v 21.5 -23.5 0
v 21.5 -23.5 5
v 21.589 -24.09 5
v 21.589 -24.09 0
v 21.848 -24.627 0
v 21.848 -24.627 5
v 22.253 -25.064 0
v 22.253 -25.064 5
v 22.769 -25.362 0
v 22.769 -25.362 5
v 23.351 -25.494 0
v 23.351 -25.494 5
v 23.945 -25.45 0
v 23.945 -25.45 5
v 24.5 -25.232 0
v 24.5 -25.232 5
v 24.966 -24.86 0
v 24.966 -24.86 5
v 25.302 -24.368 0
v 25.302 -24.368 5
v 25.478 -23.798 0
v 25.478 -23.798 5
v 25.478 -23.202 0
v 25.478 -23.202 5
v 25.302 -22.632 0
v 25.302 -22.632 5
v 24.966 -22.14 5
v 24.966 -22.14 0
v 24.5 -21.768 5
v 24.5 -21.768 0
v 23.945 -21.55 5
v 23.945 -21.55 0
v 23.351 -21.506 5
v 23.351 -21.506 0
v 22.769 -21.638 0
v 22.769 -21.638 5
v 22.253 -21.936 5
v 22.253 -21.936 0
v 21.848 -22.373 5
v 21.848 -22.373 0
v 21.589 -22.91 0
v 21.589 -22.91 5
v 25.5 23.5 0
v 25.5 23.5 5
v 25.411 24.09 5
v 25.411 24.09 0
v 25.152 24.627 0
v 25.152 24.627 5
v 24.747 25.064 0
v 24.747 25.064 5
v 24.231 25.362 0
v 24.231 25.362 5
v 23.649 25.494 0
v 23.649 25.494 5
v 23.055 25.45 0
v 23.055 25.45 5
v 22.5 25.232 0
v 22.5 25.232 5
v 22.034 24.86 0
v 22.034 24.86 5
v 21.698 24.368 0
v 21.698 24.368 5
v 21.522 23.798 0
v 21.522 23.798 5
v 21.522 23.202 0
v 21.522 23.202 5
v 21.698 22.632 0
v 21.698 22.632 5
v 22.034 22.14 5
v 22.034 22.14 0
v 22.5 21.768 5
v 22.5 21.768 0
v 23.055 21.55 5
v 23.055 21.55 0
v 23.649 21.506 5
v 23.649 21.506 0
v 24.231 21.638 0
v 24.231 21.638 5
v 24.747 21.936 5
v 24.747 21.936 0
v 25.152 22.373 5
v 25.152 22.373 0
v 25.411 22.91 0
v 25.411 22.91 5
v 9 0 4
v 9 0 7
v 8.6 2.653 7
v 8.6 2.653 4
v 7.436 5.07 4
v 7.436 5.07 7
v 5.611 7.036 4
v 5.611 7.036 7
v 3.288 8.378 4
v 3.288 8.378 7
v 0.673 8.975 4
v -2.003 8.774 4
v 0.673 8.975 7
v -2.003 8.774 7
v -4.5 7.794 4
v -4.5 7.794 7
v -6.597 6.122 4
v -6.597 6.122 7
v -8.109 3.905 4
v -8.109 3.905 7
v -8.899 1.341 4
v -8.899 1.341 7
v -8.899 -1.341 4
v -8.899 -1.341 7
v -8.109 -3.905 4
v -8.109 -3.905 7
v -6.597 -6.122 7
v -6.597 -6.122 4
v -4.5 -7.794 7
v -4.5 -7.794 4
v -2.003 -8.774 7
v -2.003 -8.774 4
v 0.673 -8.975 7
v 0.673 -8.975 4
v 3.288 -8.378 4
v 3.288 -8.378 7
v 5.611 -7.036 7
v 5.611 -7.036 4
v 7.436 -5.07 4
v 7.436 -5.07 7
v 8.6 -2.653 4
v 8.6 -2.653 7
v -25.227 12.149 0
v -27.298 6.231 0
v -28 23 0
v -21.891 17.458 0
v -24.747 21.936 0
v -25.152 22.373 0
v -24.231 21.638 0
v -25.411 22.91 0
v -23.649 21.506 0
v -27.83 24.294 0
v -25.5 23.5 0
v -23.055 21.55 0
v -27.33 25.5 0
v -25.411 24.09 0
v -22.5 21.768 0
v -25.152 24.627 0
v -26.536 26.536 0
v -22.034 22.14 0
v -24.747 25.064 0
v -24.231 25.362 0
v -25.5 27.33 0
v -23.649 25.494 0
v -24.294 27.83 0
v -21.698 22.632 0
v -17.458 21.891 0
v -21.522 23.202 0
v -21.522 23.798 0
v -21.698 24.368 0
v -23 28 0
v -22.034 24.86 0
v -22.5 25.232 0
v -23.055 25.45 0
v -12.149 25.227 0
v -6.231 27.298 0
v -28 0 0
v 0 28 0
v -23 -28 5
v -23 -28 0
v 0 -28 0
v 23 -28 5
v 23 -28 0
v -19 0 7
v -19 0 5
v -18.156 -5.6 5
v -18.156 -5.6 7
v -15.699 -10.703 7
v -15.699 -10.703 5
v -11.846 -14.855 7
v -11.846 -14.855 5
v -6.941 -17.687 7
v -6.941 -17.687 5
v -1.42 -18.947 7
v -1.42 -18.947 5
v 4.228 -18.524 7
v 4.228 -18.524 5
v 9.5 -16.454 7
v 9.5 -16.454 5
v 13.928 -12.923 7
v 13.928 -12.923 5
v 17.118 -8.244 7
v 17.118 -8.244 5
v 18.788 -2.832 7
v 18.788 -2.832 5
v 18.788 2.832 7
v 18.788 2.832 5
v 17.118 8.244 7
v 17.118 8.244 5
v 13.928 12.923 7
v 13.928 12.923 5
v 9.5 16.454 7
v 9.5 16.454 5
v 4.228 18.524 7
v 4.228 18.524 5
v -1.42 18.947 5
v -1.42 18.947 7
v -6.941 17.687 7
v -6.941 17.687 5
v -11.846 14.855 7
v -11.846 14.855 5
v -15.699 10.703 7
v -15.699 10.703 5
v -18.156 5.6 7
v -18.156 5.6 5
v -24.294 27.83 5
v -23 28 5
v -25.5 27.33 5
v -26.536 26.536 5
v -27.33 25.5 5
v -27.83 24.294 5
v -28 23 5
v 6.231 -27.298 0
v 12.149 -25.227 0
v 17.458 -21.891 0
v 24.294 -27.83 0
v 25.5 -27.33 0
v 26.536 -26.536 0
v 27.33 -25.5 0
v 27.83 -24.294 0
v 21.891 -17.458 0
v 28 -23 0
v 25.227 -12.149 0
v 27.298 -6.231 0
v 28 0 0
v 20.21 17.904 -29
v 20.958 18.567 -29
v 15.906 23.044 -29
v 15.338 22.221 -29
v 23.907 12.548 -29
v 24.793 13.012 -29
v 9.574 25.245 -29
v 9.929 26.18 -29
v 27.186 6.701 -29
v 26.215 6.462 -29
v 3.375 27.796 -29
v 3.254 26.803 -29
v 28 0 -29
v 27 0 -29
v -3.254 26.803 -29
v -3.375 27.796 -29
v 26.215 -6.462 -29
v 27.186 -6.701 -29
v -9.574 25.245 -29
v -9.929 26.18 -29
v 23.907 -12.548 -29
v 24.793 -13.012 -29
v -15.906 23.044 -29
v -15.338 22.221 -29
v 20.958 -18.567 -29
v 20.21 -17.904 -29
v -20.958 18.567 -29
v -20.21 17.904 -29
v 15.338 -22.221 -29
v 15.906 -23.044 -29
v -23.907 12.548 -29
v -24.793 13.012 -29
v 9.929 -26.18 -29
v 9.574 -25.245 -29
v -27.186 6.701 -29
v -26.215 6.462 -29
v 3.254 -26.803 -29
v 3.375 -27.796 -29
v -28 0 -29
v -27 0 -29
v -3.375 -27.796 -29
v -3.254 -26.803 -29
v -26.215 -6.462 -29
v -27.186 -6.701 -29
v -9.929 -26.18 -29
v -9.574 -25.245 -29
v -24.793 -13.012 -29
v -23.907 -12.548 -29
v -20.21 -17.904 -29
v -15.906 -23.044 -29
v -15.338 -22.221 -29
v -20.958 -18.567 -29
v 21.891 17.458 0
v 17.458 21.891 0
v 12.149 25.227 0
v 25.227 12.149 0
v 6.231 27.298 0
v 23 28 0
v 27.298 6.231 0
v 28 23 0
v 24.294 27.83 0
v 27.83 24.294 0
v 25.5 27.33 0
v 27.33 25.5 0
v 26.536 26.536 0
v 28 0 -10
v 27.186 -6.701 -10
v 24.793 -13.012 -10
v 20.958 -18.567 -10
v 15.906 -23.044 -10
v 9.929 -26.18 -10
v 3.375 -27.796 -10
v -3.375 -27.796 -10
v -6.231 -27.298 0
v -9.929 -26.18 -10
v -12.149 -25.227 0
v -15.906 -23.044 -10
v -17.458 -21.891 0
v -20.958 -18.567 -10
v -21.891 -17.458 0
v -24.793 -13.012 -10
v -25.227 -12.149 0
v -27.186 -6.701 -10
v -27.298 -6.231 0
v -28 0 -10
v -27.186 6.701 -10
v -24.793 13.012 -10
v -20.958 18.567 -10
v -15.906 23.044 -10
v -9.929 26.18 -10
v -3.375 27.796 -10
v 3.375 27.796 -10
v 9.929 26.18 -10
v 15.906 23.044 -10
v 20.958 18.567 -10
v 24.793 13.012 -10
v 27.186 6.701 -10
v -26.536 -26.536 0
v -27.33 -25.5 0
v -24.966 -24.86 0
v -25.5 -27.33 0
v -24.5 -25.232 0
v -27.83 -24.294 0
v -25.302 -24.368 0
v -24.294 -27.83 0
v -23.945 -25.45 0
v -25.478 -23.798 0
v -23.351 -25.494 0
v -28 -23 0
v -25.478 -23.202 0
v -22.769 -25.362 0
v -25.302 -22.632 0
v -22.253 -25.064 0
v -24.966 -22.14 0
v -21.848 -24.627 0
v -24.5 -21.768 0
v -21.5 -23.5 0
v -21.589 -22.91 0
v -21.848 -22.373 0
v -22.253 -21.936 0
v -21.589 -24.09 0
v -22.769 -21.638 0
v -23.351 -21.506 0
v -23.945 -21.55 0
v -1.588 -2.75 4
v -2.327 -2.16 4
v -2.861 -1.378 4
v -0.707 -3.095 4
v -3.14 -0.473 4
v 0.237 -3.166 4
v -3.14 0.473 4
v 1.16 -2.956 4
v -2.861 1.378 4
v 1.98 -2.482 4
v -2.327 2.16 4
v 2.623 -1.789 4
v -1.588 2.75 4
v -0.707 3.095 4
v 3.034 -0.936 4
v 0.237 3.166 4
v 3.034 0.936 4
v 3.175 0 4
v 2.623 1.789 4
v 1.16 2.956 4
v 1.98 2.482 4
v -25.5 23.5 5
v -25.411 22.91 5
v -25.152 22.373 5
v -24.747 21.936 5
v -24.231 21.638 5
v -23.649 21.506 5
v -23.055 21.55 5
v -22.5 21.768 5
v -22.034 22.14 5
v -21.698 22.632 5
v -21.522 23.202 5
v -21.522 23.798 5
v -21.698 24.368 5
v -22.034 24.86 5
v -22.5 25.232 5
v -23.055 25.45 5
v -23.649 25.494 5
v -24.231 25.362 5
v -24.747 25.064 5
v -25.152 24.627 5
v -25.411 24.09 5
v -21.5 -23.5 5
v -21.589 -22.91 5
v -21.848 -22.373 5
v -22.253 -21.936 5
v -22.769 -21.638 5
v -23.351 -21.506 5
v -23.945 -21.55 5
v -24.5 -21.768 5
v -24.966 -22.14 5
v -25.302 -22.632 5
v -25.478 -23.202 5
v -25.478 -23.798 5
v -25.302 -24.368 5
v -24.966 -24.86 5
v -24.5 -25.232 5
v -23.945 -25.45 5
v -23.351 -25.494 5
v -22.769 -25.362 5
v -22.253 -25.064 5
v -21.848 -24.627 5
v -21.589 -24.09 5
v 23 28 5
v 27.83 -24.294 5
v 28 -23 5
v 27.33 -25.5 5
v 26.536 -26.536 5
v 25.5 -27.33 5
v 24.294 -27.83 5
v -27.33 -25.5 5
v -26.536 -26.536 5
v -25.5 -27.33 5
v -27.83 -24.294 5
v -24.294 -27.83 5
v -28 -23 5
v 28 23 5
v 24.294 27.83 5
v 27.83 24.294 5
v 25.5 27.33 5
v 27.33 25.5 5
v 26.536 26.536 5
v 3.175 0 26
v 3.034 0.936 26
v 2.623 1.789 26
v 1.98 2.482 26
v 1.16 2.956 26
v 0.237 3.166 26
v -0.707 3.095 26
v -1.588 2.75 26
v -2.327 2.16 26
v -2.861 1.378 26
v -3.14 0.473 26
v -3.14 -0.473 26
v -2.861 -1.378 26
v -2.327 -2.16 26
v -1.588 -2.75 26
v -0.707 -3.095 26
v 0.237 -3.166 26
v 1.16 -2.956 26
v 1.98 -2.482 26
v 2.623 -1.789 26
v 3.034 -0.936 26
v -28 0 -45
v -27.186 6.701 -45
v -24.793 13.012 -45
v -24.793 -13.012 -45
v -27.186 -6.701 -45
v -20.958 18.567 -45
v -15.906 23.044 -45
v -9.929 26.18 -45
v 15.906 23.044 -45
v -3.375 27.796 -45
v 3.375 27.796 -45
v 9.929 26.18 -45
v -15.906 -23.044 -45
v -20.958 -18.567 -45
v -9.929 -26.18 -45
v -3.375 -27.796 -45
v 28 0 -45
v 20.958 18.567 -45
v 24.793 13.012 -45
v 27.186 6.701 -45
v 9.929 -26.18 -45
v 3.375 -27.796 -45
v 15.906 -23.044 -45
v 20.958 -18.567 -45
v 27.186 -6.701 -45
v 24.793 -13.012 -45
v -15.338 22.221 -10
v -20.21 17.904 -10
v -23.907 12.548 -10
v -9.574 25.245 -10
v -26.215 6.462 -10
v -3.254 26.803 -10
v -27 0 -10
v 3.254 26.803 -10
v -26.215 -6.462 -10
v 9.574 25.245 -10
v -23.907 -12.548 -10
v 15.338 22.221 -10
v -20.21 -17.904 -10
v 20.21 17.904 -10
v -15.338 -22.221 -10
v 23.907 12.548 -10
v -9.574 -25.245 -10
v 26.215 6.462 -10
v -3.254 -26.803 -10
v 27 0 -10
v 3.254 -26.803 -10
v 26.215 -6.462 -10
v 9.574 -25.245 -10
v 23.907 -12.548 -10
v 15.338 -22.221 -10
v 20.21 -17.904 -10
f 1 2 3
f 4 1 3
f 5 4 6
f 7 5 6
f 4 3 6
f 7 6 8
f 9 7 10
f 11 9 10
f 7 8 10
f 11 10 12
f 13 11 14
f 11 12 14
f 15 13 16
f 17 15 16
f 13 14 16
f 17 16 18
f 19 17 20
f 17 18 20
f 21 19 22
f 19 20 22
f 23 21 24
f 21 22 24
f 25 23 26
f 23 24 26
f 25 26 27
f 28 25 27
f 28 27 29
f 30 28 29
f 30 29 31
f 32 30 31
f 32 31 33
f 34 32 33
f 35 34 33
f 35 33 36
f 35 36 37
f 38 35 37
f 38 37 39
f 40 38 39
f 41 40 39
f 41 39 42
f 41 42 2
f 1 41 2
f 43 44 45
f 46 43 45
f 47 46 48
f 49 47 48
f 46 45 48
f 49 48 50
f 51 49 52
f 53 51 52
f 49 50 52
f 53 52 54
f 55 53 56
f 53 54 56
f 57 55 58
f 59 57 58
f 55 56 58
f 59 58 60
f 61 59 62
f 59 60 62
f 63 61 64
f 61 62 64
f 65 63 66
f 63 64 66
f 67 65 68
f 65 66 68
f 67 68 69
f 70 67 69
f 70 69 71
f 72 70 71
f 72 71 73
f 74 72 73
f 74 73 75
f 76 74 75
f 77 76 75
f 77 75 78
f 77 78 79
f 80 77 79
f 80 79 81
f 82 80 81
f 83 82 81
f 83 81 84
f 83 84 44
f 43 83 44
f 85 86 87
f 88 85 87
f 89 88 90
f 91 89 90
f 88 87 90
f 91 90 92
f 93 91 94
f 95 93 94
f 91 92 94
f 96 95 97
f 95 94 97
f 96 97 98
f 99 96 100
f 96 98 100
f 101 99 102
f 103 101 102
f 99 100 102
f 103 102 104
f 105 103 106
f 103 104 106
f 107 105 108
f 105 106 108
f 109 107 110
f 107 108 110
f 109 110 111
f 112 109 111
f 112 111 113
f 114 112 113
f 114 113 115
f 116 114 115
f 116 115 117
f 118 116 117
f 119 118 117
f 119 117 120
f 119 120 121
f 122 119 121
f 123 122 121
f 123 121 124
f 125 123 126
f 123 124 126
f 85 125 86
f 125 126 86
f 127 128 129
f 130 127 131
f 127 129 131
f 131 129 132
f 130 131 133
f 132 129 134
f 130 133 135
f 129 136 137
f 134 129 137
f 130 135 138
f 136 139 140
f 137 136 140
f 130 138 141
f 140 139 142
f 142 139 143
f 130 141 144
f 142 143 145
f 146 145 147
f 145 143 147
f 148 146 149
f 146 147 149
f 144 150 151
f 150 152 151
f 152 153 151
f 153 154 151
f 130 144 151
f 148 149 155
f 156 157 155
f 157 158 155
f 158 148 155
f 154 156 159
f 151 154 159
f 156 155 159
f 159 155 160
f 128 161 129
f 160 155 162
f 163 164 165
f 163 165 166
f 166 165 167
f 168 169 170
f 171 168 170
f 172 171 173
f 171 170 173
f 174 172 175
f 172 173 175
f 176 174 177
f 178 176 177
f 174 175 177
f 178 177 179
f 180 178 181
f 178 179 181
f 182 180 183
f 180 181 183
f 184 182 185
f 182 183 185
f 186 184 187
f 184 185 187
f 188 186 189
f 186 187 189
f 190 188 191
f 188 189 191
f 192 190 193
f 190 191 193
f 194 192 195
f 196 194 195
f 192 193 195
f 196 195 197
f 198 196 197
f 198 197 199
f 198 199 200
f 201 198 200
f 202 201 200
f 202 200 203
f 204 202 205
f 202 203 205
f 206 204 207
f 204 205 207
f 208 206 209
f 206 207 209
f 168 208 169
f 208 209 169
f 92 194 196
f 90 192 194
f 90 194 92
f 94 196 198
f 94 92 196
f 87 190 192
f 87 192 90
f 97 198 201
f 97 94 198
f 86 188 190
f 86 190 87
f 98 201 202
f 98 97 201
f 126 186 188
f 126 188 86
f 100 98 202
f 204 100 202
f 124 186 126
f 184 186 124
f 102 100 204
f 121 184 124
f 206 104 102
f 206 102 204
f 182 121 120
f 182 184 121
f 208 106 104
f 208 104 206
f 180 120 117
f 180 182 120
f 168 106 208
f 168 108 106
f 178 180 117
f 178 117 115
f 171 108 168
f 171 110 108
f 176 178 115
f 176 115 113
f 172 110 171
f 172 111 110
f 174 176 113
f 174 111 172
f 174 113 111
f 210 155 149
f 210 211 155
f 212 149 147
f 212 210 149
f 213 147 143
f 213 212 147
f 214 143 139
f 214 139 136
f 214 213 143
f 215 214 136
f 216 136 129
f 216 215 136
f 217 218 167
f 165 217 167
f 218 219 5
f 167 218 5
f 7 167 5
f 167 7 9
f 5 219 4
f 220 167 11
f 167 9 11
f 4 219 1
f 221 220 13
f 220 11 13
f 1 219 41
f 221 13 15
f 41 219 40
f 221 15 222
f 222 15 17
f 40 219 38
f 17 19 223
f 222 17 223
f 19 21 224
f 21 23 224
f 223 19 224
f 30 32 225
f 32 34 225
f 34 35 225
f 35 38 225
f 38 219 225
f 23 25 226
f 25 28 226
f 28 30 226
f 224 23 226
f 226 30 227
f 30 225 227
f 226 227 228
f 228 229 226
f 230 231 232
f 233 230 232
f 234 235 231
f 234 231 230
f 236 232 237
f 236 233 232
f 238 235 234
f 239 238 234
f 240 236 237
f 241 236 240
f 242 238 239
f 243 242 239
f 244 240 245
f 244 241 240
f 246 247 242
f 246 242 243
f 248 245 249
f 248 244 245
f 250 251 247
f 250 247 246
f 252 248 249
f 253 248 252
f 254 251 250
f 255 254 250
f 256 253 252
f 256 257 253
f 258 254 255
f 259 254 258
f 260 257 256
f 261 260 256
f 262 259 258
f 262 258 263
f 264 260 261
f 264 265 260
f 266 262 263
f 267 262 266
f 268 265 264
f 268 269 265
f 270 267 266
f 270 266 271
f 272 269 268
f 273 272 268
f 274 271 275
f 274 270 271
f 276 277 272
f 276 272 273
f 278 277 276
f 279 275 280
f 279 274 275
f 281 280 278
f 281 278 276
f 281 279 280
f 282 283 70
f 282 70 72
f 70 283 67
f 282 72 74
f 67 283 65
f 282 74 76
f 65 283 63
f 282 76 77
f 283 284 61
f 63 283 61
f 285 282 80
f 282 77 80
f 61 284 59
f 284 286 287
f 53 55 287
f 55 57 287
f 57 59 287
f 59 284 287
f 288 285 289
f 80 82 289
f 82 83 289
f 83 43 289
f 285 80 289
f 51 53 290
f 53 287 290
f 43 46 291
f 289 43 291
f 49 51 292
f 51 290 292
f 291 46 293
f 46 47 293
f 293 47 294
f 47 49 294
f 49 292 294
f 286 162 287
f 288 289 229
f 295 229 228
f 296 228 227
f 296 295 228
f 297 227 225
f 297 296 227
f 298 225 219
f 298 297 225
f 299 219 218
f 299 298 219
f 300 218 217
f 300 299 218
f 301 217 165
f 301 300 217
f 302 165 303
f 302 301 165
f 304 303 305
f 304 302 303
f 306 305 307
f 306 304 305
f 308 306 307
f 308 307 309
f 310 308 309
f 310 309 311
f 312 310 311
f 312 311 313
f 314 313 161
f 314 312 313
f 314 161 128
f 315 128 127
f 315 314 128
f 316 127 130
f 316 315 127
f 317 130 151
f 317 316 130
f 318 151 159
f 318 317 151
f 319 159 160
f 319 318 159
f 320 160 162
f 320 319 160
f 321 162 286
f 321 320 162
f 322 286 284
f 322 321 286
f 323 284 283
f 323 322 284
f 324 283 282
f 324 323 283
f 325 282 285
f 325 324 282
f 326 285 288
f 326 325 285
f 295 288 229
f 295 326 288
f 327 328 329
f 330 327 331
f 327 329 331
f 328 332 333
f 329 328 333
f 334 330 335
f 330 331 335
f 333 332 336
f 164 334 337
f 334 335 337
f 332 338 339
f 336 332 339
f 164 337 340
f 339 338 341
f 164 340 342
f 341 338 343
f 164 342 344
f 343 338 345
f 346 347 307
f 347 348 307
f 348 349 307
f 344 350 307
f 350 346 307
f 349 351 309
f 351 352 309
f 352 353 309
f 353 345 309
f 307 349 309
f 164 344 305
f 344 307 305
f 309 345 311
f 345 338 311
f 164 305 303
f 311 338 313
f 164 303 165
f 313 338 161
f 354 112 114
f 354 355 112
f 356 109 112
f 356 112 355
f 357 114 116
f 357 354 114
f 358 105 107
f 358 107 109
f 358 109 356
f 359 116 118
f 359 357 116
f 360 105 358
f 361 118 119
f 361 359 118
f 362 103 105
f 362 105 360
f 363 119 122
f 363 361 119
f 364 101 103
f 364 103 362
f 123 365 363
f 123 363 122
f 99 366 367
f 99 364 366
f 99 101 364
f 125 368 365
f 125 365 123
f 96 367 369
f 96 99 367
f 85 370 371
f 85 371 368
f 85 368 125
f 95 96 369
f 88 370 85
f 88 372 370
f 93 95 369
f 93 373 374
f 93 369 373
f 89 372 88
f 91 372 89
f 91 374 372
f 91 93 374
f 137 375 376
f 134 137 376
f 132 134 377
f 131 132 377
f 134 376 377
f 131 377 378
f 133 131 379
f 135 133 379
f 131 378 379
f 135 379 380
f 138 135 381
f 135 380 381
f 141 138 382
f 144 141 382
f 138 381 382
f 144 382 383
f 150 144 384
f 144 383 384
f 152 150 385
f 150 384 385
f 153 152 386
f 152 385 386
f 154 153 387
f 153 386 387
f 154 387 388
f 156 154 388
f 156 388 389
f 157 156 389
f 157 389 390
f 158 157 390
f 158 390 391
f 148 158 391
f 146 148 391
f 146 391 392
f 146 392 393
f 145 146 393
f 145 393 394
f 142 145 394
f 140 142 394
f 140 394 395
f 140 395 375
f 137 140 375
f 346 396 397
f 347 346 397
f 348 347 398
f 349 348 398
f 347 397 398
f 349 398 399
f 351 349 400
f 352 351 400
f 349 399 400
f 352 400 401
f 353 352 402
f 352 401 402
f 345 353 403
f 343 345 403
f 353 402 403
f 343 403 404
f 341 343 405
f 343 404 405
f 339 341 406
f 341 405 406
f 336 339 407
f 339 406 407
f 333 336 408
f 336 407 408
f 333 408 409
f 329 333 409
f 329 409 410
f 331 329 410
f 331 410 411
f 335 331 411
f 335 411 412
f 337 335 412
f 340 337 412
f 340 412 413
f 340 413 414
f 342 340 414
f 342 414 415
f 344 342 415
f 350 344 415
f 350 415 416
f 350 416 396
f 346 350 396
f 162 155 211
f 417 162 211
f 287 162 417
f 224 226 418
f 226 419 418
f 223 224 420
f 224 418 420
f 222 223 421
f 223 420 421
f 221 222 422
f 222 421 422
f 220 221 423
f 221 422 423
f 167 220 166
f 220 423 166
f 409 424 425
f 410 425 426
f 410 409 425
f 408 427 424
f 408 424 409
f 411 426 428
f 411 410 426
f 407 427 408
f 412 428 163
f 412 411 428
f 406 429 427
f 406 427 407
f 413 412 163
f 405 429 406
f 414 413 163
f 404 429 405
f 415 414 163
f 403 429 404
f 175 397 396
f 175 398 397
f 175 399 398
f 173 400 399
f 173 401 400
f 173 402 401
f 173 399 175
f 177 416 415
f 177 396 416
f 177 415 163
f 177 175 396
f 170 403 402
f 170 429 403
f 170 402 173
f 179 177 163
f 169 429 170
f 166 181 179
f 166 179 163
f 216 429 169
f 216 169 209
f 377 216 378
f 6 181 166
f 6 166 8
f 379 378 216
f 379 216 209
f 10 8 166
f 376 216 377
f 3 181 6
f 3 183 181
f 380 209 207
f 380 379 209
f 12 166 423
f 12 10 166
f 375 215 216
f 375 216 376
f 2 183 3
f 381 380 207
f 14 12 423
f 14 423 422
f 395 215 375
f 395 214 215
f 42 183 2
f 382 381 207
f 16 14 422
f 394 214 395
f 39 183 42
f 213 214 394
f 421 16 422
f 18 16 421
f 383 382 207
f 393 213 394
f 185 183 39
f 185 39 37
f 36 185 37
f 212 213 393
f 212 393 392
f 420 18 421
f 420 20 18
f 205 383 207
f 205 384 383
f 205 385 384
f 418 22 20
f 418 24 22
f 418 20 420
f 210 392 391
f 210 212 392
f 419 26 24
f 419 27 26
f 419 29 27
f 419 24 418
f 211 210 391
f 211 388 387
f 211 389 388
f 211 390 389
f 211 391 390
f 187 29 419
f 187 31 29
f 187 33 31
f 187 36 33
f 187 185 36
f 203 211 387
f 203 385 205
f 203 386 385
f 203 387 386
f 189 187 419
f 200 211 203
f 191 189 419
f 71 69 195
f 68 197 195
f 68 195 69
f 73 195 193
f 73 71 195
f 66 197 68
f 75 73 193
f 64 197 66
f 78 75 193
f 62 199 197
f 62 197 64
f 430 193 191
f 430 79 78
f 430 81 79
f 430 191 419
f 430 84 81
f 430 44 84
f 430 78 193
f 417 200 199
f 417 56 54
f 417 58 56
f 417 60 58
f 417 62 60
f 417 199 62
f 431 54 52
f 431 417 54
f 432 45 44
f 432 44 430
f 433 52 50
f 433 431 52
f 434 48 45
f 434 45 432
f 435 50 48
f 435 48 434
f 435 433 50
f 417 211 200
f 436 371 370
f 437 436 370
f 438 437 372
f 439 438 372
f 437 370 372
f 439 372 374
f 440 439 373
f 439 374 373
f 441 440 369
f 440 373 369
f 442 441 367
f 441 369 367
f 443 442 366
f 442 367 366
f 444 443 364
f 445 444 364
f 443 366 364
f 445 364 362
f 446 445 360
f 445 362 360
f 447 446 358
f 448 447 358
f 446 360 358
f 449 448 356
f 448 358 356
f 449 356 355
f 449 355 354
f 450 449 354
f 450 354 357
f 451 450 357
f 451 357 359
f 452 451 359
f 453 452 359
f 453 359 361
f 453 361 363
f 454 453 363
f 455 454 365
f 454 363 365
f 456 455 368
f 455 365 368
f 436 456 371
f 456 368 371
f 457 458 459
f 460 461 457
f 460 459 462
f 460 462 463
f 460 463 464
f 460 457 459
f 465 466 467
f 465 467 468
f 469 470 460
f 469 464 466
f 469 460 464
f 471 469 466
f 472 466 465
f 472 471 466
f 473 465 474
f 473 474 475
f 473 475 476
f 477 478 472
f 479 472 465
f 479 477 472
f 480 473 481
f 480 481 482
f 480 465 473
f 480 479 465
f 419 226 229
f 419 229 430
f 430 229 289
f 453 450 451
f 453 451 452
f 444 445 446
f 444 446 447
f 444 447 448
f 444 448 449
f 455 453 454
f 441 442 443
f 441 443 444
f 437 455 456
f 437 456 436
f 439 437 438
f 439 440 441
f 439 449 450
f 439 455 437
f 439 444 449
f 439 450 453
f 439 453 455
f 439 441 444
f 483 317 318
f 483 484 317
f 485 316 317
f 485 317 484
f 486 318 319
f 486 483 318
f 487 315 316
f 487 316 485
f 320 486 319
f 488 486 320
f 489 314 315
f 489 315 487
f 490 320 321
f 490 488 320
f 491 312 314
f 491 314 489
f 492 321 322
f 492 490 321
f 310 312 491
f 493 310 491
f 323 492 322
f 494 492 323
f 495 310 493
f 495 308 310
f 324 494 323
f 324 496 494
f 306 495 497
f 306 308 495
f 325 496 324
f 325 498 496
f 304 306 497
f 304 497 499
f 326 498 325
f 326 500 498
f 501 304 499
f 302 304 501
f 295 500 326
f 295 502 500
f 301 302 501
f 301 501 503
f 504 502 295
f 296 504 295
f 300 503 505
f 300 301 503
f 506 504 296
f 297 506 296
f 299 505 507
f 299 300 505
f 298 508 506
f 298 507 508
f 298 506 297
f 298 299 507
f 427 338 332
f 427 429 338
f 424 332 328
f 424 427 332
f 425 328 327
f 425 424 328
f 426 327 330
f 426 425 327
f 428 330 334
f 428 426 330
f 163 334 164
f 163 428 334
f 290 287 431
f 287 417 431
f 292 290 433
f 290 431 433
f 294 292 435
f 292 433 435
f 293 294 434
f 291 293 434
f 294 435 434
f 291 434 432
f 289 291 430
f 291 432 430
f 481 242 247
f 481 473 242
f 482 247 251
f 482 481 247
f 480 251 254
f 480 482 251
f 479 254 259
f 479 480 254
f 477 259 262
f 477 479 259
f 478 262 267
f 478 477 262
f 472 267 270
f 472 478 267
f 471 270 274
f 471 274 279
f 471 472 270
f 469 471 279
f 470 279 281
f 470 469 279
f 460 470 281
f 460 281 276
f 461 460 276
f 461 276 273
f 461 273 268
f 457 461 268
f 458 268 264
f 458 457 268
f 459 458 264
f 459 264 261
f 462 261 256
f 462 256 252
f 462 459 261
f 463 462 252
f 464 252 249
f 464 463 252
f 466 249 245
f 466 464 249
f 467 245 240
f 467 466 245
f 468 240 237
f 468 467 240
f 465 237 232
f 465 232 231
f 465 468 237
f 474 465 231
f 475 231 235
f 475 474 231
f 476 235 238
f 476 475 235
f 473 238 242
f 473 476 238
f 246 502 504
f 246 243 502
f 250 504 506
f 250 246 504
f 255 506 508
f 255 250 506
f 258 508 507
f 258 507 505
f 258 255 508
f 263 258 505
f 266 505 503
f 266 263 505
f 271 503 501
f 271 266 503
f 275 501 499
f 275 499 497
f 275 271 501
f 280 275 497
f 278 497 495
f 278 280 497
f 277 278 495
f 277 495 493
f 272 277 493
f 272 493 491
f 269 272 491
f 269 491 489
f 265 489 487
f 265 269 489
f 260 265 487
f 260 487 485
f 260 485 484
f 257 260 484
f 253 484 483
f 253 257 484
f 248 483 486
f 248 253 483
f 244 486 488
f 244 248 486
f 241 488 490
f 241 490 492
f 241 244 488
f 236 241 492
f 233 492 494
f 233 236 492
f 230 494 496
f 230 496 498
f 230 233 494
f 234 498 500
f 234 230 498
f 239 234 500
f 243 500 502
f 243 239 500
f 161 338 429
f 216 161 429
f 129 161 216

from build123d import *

# Parameters (mm, degrees)
ESQUISSE1_W             = 56
ESQUISSE1_H             = 56
BOSS_EXTRU_1_DEPTH      = 5
ESQUISSE3_R             = 19
BOSS_EXTRU_2_DEPTH      = 2
ESQUISSE4_R             = 9
ENL_V_MAT_EXTRU_1_DEPTH = 3
ESQUISSE5_R             = 3.175
BOSS_EXTRU_3_DEPTH      = 22
ENL_V_MAT_EXTRU_2_REACH = 65.781
ESQUISSE6_R             = 2
CONG_1_R                = 5


with BuildPart() as part:
    # Esquisse1 → Boss.-Extru.1 (new body)
    with BuildSketch(Plane.XY):
        Rectangle(ESQUISSE1_W, ESQUISSE1_H)
    extrude(amount=BOSS_EXTRU_1_DEPTH)

    # Esquisse2 → Révolution1 (revolve)
    with BuildSketch(Plane(origin=(0, 0, 0), x_dir=(1, 0, 0), z_dir=(0, 1, 0))):
        Polygon((0, 0), (28, 0), (28, 10), (27, 10), (27, 29), (28, 29), (28, 45), (0, 45), align=None)
    revolve(axis=Axis((0, 0, 0), (0, 0, -1)))

    # Esquisse3 → Boss.-Extru.2 (add)
    with BuildSketch(Plane.XY.offset(5)):
        with Locations(Location((0, 0, 0), (0, 0, 180))):
            Circle(ESQUISSE3_R)
    extrude(amount=BOSS_EXTRU_2_DEPTH)

    # Esquisse4 → Enlèv. mat.-Extru.1 (cut)
    with BuildSketch(Plane.XY.offset(7)):
        Circle(ESQUISSE4_R)
    extrude(amount=-ENL_V_MAT_EXTRU_1_DEPTH, mode=Mode.SUBTRACT)

    # Esquisse5 → Boss.-Extru.3 (add)
    with BuildSketch(Plane.XY.offset(4)):
        Circle(ESQUISSE5_R)
    extrude(amount=BOSS_EXTRU_3_DEPTH)

    # Esquisse6 → Enlèv. mat.-Extru.2 (cut, up to next)
    with BuildSketch(Plane.XY.offset(5), mode=Mode.PRIVATE) as enl_v_mat_extru_2_sk1:
        with Locations((23.5, 23.5)):
            Circle(ESQUISSE6_R)
    enl_v_mat_extru_2_tool1 = extrude(enl_v_mat_extru_2_sk1.sketch, amount=-ENL_V_MAT_EXTRU_2_REACH, mode=Mode.PRIVATE) & part.part
    # Esquisse6 → Enlèv. mat.-Extru.2 (cut, up to next)
    with BuildSketch(Plane.XY.offset(5), mode=Mode.PRIVATE) as enl_v_mat_extru_2_sk2:
        with Locations(Location((-23.5, 23.5, 0), (0, 0, 180))):
            Circle(ESQUISSE6_R)
    enl_v_mat_extru_2_tool2 = extrude(enl_v_mat_extru_2_sk2.sketch, amount=-ENL_V_MAT_EXTRU_2_REACH, mode=Mode.PRIVATE) & part.part
    # Esquisse6 → Enlèv. mat.-Extru.2 (cut, up to next)
    with BuildSketch(Plane.XY.offset(5), mode=Mode.PRIVATE) as enl_v_mat_extru_2_sk3:
        with Locations(Location((23.5, -23.5, 0), (0, 0, 180))):
            Circle(ESQUISSE6_R)
    enl_v_mat_extru_2_tool3 = extrude(enl_v_mat_extru_2_sk3.sketch, amount=-ENL_V_MAT_EXTRU_2_REACH, mode=Mode.PRIVATE) & part.part
    # Esquisse6 → Enlèv. mat.-Extru.2 (cut, up to next)
    with BuildSketch(Plane.XY.offset(5), mode=Mode.PRIVATE) as enl_v_mat_extru_2_sk4:
        with Locations((-23.5, -23.5)):
            Circle(ESQUISSE6_R)
    enl_v_mat_extru_2_tool4 = extrude(enl_v_mat_extru_2_sk4.sketch, amount=-ENL_V_MAT_EXTRU_2_REACH, mode=Mode.PRIVATE) & part.part
    add(enl_v_mat_extru_2_tool1.solids().sort_by_distance((23.5, 23.5, 5))[0], mode=Mode.SUBTRACT)
    add(enl_v_mat_extru_2_tool2.solids().sort_by_distance((-23.5, 23.5, 5))[0], mode=Mode.SUBTRACT)
    add(enl_v_mat_extru_2_tool3.solids().sort_by_distance((23.5, -23.5, 5))[0], mode=Mode.SUBTRACT)
    add(enl_v_mat_extru_2_tool4.solids().sort_by_distance((-23.5, -23.5, 5))[0], mode=Mode.SUBTRACT)

    # Congé1
    cong_1_edges = [part.edges().sort_by_distance(p)[0] for p in [
        (-28, 28, 2.5),
        (28, 28, 2.5),
        (28, -28, 2.5),
        (-28, -28, 2.5),
    ]]
    fillet(cong_1_edges, radius=CONG_1_R)


solid = part.part
